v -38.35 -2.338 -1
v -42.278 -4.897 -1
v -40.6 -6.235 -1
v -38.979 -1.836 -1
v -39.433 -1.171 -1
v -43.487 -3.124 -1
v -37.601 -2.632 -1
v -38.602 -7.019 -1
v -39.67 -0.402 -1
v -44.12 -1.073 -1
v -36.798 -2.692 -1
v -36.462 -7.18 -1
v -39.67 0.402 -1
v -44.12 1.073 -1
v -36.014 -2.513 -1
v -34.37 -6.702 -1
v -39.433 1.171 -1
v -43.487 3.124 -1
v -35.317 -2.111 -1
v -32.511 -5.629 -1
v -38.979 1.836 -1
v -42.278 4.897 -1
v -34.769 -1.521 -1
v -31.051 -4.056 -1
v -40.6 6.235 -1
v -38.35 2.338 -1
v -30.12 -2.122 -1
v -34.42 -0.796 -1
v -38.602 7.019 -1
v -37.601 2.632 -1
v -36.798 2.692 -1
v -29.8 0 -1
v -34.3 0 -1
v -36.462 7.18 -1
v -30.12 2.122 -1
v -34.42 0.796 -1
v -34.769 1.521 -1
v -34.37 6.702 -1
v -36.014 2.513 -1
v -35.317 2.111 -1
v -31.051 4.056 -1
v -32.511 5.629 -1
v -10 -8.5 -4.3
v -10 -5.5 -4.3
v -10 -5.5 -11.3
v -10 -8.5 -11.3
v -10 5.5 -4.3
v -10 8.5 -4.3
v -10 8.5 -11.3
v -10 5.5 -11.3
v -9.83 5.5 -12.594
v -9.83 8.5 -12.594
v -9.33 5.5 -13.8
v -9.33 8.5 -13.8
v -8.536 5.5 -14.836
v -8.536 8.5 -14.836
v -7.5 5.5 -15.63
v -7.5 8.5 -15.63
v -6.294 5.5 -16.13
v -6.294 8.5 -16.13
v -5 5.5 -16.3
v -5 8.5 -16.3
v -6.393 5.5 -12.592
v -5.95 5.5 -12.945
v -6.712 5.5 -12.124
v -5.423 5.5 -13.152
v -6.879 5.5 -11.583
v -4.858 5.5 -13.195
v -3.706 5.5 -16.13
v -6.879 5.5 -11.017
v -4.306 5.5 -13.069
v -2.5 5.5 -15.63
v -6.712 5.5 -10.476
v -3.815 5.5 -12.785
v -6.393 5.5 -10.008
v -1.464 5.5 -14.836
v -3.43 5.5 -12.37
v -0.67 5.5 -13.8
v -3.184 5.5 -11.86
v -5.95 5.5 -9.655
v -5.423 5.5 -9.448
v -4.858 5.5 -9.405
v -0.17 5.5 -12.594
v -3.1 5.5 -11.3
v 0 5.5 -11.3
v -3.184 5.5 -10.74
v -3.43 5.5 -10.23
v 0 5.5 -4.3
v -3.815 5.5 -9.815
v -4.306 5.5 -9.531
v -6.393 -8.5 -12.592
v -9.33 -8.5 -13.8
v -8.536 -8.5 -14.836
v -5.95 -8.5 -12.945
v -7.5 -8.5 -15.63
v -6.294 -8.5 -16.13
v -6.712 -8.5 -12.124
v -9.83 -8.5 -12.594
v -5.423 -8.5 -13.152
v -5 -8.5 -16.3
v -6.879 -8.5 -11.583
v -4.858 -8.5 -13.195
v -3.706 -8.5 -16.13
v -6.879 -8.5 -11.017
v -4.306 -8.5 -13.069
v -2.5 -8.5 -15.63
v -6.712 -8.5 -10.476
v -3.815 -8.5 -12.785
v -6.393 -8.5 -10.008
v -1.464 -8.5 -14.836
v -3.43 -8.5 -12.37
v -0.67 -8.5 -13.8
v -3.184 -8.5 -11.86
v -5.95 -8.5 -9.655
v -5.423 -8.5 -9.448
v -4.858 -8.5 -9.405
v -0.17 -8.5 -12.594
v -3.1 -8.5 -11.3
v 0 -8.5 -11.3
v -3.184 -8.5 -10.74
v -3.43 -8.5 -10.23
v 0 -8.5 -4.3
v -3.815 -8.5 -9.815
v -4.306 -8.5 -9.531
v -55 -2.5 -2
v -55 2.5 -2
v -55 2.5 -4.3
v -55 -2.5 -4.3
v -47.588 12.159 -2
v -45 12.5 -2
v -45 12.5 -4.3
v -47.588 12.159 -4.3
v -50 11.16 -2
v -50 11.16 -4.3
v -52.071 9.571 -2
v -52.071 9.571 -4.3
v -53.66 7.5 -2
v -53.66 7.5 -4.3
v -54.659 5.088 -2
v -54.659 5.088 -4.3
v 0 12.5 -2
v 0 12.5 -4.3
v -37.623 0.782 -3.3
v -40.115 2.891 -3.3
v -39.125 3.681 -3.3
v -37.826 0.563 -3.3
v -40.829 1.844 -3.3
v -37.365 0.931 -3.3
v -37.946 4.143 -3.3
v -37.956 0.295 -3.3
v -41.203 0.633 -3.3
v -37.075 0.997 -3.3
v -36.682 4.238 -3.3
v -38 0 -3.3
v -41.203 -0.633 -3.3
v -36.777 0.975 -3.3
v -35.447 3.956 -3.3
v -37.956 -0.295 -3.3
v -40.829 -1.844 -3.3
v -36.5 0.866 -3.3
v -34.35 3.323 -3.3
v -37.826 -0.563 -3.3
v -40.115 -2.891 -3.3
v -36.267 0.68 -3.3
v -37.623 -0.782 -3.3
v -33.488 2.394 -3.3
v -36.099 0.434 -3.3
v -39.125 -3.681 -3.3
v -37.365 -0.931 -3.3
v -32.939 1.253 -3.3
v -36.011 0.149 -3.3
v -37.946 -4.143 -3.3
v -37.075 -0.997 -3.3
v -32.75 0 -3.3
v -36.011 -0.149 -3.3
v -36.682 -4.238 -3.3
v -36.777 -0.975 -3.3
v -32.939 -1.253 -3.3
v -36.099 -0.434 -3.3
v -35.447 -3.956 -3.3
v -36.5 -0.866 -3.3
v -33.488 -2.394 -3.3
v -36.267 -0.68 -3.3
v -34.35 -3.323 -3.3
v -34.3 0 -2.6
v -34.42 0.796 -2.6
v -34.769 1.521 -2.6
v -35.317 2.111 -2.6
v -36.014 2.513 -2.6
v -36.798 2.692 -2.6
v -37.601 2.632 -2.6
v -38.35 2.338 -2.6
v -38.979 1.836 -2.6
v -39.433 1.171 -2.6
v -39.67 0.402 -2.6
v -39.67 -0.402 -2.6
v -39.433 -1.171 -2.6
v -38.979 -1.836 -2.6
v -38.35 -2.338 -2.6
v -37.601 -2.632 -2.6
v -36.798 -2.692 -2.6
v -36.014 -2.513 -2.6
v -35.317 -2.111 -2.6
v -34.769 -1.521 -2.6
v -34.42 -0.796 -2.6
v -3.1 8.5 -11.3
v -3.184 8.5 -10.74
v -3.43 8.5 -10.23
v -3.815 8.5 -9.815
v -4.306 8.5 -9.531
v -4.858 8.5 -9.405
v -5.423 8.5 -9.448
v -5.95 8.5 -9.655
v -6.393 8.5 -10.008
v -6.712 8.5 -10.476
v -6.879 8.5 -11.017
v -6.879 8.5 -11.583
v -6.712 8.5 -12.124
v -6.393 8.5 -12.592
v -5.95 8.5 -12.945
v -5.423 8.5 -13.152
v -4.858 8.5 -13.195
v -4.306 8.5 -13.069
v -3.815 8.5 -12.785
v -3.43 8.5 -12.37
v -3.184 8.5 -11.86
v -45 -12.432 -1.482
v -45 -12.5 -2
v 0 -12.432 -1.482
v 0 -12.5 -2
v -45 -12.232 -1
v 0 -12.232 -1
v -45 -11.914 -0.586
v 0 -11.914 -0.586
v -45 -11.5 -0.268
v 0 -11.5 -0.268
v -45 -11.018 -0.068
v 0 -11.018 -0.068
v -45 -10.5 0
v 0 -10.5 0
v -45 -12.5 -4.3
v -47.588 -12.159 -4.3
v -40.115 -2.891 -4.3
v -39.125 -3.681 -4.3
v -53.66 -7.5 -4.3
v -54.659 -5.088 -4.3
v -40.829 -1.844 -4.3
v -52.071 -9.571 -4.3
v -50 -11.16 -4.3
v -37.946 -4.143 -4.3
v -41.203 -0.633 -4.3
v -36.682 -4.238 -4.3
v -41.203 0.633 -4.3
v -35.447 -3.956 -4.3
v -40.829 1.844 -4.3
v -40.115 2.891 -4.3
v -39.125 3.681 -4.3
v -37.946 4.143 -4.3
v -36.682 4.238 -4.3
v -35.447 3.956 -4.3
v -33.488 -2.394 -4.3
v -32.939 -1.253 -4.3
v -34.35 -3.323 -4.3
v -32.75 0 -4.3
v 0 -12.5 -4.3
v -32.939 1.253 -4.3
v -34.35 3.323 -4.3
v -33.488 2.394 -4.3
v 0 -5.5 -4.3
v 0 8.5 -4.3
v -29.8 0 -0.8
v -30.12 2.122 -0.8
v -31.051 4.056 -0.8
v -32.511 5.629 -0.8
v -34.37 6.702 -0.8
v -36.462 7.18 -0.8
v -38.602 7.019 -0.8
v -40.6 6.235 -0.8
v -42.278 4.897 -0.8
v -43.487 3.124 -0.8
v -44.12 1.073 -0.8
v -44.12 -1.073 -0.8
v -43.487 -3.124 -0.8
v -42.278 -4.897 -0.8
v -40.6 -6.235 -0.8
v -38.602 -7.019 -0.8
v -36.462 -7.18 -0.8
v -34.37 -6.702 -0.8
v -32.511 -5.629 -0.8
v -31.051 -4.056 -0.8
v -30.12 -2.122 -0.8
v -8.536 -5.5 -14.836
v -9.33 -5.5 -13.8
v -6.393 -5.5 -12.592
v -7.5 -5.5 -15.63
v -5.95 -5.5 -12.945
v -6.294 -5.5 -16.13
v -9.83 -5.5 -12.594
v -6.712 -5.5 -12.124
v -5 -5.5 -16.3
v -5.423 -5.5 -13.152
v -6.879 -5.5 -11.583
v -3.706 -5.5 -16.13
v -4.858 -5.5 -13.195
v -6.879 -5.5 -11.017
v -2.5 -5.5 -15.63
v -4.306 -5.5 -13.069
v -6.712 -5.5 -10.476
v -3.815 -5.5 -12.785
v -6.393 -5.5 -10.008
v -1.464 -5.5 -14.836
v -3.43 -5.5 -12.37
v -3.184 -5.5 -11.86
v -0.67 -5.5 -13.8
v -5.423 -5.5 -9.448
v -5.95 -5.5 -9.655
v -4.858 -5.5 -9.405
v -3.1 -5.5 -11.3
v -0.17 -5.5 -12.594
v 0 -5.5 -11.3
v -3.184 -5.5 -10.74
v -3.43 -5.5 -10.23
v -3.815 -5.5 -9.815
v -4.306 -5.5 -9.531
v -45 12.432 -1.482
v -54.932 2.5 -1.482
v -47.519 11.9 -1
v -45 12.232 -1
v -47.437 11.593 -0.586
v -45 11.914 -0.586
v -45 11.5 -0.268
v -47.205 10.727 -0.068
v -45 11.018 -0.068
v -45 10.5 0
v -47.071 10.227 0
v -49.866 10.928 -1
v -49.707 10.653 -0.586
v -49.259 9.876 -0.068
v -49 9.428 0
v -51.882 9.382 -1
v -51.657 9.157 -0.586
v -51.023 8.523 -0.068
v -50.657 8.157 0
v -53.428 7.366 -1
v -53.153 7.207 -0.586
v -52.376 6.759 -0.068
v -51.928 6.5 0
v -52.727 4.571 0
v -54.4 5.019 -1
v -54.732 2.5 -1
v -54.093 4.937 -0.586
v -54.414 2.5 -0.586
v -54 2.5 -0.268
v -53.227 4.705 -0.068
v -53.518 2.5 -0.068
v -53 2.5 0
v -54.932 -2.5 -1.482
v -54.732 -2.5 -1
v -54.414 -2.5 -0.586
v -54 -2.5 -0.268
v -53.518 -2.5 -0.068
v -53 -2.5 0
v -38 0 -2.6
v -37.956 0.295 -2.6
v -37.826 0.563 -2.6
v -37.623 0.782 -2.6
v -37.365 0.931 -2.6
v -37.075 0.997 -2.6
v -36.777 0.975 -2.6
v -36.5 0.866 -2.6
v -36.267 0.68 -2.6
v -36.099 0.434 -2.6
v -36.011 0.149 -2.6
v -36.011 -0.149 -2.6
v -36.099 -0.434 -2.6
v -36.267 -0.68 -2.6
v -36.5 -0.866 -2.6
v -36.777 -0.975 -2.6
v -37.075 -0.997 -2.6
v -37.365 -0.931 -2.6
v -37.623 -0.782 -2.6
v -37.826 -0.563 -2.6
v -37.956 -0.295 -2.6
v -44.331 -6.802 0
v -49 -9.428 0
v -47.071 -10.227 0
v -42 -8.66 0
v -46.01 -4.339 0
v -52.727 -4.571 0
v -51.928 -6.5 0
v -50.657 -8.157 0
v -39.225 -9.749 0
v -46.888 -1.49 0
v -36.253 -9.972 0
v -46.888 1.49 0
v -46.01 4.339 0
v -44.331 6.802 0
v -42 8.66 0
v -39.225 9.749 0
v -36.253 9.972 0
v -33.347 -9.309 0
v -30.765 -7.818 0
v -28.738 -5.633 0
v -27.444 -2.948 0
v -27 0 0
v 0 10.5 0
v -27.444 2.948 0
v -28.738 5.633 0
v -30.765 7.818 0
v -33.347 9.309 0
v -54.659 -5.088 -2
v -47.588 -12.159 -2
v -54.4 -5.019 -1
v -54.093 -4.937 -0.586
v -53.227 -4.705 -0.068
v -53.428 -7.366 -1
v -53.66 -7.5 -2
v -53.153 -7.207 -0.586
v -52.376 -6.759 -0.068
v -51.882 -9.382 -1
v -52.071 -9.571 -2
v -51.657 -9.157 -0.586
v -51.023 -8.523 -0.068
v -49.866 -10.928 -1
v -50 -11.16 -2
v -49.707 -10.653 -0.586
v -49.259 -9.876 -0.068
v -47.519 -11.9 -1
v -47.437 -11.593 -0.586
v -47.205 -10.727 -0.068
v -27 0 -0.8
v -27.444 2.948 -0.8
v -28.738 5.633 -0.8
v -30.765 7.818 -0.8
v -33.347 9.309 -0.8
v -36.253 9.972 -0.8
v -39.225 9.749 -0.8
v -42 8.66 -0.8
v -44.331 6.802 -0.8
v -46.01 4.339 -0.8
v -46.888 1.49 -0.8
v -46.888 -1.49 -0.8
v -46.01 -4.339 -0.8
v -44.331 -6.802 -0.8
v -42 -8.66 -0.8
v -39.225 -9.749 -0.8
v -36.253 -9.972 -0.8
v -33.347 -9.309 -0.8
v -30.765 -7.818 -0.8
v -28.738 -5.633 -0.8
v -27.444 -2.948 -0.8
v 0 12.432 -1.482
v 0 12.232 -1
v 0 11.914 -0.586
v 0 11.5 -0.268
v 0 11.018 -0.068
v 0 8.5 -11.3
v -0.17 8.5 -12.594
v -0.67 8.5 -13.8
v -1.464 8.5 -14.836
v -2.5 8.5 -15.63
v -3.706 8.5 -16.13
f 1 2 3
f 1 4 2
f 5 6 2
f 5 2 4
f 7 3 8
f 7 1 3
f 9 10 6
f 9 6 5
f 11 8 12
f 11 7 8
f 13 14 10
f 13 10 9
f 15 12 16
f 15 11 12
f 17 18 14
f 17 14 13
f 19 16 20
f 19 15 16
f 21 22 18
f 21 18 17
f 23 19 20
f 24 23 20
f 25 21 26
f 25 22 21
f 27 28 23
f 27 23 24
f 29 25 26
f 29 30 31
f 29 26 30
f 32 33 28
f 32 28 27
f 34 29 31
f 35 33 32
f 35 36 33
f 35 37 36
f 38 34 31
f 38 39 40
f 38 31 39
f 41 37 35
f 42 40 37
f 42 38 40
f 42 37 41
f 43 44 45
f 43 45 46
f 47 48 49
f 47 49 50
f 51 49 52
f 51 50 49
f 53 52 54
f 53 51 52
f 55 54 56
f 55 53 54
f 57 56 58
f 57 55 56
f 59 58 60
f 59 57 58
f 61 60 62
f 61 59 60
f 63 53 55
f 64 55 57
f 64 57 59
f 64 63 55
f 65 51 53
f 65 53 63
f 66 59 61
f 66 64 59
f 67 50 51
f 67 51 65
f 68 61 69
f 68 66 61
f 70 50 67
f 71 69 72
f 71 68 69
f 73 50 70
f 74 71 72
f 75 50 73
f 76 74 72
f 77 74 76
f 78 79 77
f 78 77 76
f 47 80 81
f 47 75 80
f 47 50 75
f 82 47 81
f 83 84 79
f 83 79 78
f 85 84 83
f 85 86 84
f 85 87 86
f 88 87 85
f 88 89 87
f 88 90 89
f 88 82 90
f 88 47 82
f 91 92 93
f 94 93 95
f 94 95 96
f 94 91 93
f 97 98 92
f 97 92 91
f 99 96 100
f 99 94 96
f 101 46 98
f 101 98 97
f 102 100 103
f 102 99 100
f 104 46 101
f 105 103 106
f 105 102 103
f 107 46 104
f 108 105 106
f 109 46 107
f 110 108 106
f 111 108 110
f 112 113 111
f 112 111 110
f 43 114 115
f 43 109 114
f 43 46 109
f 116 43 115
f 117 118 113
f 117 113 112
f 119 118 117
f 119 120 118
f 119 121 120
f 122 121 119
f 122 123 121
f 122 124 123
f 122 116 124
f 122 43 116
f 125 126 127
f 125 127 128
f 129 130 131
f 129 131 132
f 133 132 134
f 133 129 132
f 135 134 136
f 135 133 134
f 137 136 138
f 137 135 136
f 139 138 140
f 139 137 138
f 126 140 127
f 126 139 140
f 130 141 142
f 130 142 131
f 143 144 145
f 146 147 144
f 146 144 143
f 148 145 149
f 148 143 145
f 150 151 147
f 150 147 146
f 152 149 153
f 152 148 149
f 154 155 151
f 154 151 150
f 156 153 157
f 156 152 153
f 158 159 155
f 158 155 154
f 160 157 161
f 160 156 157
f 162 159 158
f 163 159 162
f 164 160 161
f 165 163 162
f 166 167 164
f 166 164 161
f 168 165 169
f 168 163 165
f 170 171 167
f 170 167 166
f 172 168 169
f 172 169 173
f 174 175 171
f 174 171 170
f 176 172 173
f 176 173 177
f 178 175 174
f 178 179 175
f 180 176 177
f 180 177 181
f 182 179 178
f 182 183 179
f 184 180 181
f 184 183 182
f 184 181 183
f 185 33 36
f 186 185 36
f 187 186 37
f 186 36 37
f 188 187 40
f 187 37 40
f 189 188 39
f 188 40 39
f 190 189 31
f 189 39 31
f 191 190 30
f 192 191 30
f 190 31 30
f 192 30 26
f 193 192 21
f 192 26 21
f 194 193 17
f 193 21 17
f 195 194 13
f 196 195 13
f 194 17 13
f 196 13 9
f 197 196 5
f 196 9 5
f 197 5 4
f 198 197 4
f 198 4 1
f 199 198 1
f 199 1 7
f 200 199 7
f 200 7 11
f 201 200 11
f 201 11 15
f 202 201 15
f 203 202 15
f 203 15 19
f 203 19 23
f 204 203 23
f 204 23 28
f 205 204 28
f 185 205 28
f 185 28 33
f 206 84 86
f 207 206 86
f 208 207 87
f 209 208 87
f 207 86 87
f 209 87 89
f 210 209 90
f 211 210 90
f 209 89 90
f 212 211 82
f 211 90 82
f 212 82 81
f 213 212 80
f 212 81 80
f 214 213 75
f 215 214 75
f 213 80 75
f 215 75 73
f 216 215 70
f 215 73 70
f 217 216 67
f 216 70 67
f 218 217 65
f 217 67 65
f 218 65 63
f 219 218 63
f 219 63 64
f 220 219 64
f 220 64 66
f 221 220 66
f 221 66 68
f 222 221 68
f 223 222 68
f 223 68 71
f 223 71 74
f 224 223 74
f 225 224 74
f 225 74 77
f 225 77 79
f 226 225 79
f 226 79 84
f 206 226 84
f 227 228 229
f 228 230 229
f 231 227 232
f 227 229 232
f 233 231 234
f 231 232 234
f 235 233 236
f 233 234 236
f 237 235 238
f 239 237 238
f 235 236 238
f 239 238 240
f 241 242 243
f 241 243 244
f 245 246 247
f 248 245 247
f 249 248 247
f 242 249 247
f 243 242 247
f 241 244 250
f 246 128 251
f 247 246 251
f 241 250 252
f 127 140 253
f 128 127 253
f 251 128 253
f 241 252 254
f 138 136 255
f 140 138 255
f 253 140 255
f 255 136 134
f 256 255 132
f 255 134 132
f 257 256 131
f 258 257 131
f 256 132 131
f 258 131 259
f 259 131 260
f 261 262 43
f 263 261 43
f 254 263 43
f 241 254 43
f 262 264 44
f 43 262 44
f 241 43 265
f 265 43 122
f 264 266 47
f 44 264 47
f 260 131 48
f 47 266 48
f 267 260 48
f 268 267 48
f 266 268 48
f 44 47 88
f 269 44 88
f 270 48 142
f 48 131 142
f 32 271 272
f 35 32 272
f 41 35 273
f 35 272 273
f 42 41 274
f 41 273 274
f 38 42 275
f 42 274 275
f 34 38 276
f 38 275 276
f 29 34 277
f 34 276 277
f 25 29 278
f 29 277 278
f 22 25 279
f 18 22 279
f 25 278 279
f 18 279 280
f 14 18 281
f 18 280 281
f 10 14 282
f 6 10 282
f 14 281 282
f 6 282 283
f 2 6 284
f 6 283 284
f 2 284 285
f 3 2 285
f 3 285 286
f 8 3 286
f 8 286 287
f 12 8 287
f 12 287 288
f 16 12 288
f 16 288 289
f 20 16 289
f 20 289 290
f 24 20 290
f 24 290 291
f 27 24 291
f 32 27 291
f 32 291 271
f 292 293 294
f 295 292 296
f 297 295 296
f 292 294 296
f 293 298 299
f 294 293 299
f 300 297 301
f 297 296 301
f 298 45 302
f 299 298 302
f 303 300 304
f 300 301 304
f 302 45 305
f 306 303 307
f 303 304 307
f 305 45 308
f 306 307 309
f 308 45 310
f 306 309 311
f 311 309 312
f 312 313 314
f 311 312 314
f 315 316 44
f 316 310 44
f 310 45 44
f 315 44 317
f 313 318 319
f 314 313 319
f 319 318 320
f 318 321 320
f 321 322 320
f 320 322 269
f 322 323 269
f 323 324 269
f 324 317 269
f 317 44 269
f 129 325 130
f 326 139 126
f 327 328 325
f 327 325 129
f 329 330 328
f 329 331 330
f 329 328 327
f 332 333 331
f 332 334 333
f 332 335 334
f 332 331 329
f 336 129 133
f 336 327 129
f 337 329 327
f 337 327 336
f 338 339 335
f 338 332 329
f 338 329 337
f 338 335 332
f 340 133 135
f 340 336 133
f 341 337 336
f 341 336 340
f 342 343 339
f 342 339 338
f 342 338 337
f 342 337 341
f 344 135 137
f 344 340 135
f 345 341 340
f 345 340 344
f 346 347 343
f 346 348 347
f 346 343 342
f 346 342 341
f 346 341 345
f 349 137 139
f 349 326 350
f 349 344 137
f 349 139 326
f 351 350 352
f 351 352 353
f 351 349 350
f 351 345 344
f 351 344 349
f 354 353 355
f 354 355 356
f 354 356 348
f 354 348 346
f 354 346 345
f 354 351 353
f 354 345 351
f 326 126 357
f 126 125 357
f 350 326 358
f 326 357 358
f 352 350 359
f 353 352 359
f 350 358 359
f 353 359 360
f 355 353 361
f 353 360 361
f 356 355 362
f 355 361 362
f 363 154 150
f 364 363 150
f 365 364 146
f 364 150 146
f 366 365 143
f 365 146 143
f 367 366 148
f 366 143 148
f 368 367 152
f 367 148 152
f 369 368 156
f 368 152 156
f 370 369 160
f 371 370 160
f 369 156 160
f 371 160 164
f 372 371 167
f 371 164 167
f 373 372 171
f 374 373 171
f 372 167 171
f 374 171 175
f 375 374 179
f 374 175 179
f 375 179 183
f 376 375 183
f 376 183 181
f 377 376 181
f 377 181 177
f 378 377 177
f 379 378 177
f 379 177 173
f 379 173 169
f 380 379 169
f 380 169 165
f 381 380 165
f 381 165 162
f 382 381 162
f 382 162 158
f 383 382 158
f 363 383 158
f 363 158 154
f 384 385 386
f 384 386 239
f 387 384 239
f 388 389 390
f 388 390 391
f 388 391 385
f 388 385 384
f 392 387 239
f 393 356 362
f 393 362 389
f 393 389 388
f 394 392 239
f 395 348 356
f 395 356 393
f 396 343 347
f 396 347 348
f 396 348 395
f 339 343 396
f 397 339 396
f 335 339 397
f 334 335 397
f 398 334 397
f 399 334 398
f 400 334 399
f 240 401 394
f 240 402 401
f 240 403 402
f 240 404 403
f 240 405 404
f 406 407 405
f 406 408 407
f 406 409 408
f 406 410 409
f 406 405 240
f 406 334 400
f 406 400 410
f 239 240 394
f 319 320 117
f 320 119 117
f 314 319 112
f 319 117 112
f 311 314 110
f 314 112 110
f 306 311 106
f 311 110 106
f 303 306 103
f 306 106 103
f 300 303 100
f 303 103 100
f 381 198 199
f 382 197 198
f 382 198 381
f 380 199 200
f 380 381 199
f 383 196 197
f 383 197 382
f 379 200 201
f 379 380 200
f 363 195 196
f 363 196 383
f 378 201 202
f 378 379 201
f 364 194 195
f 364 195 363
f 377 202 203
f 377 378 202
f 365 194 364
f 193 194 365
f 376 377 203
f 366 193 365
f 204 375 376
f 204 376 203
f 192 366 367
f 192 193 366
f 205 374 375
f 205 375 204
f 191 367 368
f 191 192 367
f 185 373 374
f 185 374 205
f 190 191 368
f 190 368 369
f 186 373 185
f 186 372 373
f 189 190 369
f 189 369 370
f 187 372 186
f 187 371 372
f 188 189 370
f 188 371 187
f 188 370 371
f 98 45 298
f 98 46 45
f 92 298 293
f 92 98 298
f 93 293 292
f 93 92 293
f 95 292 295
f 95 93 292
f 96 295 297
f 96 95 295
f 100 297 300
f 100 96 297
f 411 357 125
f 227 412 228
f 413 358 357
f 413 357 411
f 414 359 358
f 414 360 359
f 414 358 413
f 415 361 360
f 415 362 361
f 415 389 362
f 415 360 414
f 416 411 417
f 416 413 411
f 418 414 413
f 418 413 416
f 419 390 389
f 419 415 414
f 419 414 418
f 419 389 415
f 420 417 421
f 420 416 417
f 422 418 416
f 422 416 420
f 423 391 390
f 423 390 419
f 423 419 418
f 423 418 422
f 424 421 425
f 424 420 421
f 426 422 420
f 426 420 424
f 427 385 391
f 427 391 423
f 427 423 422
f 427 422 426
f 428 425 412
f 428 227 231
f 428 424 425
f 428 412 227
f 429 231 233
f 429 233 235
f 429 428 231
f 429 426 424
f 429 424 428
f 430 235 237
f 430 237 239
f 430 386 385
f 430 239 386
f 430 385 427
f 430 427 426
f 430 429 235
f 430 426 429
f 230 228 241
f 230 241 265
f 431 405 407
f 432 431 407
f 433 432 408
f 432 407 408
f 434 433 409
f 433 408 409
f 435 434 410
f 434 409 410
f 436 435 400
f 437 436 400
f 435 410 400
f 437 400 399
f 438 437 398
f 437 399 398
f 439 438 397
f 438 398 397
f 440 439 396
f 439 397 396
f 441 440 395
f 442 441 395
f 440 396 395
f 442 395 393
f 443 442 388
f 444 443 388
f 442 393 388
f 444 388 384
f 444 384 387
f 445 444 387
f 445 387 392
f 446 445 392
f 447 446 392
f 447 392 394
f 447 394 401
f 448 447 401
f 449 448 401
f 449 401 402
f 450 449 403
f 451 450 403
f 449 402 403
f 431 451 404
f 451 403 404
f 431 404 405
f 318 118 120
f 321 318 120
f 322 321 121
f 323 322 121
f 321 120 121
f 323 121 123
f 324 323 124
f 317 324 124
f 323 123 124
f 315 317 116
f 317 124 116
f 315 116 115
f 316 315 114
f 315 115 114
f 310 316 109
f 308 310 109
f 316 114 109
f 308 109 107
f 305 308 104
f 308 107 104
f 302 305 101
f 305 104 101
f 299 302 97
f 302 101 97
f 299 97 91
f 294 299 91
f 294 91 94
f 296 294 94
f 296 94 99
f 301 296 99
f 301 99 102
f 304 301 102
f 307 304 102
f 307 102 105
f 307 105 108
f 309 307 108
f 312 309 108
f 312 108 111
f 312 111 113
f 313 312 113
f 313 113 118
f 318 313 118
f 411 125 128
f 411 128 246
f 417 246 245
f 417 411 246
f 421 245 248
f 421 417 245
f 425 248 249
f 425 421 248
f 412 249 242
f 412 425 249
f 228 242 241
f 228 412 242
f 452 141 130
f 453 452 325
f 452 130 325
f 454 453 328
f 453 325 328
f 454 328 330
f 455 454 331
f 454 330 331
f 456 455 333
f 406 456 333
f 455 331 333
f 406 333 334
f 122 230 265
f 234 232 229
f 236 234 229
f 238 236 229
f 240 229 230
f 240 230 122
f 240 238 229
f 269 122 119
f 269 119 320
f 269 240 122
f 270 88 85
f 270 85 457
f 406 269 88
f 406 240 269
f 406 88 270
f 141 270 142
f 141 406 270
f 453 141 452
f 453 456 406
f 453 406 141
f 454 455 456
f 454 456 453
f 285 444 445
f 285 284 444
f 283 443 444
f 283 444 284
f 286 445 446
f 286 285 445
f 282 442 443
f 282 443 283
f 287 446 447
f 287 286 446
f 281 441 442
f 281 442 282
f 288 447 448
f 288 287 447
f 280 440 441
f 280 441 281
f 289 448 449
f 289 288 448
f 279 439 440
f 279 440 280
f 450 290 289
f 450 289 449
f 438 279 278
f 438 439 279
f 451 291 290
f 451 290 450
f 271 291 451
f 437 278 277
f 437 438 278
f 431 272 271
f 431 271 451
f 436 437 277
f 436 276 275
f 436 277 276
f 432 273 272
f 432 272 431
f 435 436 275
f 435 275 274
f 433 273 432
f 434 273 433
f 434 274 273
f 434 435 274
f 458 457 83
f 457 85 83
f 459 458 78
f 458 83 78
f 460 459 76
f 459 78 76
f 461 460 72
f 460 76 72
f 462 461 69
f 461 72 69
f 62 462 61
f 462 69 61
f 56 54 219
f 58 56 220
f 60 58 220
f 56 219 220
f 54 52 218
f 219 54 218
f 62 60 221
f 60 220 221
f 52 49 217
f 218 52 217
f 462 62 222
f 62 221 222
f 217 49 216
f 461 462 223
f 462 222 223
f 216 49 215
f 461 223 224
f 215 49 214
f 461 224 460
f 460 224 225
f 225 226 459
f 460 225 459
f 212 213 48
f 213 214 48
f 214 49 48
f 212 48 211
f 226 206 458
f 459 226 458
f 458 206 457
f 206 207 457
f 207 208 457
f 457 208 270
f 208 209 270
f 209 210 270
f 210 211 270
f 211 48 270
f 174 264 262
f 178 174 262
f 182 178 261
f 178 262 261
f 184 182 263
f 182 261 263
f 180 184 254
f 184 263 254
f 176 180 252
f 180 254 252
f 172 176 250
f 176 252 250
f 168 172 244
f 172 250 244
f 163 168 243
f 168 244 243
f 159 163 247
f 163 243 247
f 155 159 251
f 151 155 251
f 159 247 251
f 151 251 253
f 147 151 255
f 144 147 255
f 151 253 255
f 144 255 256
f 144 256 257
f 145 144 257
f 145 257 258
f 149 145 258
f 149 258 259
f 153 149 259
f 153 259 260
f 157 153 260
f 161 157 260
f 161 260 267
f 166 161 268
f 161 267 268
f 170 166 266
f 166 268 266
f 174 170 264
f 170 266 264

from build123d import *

# Parameters (mm, degrees)
F0_R      = 10
F0_R_2    = 7.2
F0_R_3    = 2.7
F1_DEPTH  = 4.3
F2_DEPTH  = 0.8
F3_DEPTH  = 1
F4_R      = 4.25
F5_DEPTH  = 1
F4_W      = 10
F4_H      = 3
F6_DEPTH  = 12
F8_R      = 4.99999
F7_R      = 1.9
F9_DEPTH  = 25
F10_R     = 2
F11_DEPTH = 2.6
F12_D     = 2


# Not quite as in the source:
# - a fillet or chamfer is up to 0.001 mm smaller than in the source, because OpenCascade refuses the exact size


with BuildPart() as f1:
    # F0 (on Top) → F1 (new body)
    with BuildSketch(Plane.XY):
        with BuildLine():
            Line((0, 12.5), (-45, 12.5))
            ThreePointArc((-45, 12.5), (-52.0710678119, 9.5710678119), (-55, 2.5))
            Line((-55, 2.5), (-55, -2.5))
            ThreePointArc((-55, -2.5), (-52.0710678119, -9.5710678119), (-45, -12.5))
            Line((-45, -12.5), (0, -12.5))
            Line((0, -12.5), (0, 12.5))
        make_face()
        with Locations((-37, 0)):
            Circle(F0_R, mode=Mode.SUBTRACT)
        with Locations((-37, 0)):
            Circle(F0_R)
        with Locations((-37, 0)):
            Circle(F0_R_2, mode=Mode.SUBTRACT)
        with Locations((-37, 0)):
            Circle(F0_R_2)
        with Locations((-37, 0)):
            Circle(F0_R_3, mode=Mode.SUBTRACT)
        with Locations((-37, 0)):
            Circle(F0_R_3)
    extrude(amount=-F1_DEPTH)

    # F0 (on Top) → F2 (cut)
    with BuildSketch(Plane.XY):
        with Locations((-37, 0)):
            Circle(F0_R)
        with Locations((-37, 0)):
            Circle(F0_R_2, mode=Mode.SUBTRACT)
        with Locations((-37, 0)):
            Circle(F0_R_2)
        with Locations((-37, 0)):
            Circle(F0_R_3, mode=Mode.SUBTRACT)
    extrude(amount=-F2_DEPTH, mode=Mode.SUBTRACT)

    # F0 (on Top) → F3 (cut)
    with BuildSketch(Plane.XY):
        with Locations((-37, 0)):
            Circle(F0_R_2)
        with Locations((-37, 0)):
            Circle(F0_R_3, mode=Mode.SUBTRACT)
    extrude(amount=-F3_DEPTH, mode=Mode.SUBTRACT)

    # F4 (on face) → F5 (cut)
    with BuildSketch(Plane(origin=(0, 0, -4.3), x_dir=(1, 0, 0), z_dir=(0, 0, -1))):
        with Locations((-37, 0)):
            Circle(F4_R)
    extrude(amount=-F5_DEPTH, mode=Mode.SUBTRACT)

    # F4 (on face) → F6 (join)
    with BuildSketch(Plane(origin=(0, 0, -4.3), x_dir=(1, 0, 0), z_dir=(0, 0, -1))):
        with Locations((-5, 7)):
            Rectangle(F4_W, F4_H)
        with Locations((-5, -7)):
            Rectangle(F4_W, F4_H)
    extrude(amount=F6_DEPTH)

    # F8 (radius 5 in the source; OpenCascade refuses exactly that, so slightly less here)
    f8_edges = [f1.edges().sort_by_distance(p)[0] for p in [
        (0, -7, -16.3),
        (0, 7, -16.3),
        (-10, 7, -16.3),
        (-10, -7, -16.3),
    ]]
    fillet(f8_edges, radius=F8_R)

    # F7 (on face) → F9 (cut)
    with BuildSketch(Plane.XZ.offset(8.5)):
        with Locations((-5, -11.3)):
            Circle(F7_R)
    extrude(amount=-F9_DEPTH, mode=Mode.SUBTRACT)

    # F10
    f10_edges = [f1.edges().sort_by_distance(p)[0] for p in [
        (-22.5, -12.5, 0),
    ]]
    fillet(f10_edges, radius=F10_R)

    # F11 (cut): a face of the model
    f11_faces = [f1.faces().sort_by_distance(p)[0] for p in [
        (-37, 0, 0),
    ]]
    extrude(f11_faces, amount=-F11_DEPTH, mode=Mode.SUBTRACT)

    # F12 (through all)
    with Locations(Plane.XY):
        with Locations((-37, 0)):
            Hole(F12_D / 2)


solid = f1.part
